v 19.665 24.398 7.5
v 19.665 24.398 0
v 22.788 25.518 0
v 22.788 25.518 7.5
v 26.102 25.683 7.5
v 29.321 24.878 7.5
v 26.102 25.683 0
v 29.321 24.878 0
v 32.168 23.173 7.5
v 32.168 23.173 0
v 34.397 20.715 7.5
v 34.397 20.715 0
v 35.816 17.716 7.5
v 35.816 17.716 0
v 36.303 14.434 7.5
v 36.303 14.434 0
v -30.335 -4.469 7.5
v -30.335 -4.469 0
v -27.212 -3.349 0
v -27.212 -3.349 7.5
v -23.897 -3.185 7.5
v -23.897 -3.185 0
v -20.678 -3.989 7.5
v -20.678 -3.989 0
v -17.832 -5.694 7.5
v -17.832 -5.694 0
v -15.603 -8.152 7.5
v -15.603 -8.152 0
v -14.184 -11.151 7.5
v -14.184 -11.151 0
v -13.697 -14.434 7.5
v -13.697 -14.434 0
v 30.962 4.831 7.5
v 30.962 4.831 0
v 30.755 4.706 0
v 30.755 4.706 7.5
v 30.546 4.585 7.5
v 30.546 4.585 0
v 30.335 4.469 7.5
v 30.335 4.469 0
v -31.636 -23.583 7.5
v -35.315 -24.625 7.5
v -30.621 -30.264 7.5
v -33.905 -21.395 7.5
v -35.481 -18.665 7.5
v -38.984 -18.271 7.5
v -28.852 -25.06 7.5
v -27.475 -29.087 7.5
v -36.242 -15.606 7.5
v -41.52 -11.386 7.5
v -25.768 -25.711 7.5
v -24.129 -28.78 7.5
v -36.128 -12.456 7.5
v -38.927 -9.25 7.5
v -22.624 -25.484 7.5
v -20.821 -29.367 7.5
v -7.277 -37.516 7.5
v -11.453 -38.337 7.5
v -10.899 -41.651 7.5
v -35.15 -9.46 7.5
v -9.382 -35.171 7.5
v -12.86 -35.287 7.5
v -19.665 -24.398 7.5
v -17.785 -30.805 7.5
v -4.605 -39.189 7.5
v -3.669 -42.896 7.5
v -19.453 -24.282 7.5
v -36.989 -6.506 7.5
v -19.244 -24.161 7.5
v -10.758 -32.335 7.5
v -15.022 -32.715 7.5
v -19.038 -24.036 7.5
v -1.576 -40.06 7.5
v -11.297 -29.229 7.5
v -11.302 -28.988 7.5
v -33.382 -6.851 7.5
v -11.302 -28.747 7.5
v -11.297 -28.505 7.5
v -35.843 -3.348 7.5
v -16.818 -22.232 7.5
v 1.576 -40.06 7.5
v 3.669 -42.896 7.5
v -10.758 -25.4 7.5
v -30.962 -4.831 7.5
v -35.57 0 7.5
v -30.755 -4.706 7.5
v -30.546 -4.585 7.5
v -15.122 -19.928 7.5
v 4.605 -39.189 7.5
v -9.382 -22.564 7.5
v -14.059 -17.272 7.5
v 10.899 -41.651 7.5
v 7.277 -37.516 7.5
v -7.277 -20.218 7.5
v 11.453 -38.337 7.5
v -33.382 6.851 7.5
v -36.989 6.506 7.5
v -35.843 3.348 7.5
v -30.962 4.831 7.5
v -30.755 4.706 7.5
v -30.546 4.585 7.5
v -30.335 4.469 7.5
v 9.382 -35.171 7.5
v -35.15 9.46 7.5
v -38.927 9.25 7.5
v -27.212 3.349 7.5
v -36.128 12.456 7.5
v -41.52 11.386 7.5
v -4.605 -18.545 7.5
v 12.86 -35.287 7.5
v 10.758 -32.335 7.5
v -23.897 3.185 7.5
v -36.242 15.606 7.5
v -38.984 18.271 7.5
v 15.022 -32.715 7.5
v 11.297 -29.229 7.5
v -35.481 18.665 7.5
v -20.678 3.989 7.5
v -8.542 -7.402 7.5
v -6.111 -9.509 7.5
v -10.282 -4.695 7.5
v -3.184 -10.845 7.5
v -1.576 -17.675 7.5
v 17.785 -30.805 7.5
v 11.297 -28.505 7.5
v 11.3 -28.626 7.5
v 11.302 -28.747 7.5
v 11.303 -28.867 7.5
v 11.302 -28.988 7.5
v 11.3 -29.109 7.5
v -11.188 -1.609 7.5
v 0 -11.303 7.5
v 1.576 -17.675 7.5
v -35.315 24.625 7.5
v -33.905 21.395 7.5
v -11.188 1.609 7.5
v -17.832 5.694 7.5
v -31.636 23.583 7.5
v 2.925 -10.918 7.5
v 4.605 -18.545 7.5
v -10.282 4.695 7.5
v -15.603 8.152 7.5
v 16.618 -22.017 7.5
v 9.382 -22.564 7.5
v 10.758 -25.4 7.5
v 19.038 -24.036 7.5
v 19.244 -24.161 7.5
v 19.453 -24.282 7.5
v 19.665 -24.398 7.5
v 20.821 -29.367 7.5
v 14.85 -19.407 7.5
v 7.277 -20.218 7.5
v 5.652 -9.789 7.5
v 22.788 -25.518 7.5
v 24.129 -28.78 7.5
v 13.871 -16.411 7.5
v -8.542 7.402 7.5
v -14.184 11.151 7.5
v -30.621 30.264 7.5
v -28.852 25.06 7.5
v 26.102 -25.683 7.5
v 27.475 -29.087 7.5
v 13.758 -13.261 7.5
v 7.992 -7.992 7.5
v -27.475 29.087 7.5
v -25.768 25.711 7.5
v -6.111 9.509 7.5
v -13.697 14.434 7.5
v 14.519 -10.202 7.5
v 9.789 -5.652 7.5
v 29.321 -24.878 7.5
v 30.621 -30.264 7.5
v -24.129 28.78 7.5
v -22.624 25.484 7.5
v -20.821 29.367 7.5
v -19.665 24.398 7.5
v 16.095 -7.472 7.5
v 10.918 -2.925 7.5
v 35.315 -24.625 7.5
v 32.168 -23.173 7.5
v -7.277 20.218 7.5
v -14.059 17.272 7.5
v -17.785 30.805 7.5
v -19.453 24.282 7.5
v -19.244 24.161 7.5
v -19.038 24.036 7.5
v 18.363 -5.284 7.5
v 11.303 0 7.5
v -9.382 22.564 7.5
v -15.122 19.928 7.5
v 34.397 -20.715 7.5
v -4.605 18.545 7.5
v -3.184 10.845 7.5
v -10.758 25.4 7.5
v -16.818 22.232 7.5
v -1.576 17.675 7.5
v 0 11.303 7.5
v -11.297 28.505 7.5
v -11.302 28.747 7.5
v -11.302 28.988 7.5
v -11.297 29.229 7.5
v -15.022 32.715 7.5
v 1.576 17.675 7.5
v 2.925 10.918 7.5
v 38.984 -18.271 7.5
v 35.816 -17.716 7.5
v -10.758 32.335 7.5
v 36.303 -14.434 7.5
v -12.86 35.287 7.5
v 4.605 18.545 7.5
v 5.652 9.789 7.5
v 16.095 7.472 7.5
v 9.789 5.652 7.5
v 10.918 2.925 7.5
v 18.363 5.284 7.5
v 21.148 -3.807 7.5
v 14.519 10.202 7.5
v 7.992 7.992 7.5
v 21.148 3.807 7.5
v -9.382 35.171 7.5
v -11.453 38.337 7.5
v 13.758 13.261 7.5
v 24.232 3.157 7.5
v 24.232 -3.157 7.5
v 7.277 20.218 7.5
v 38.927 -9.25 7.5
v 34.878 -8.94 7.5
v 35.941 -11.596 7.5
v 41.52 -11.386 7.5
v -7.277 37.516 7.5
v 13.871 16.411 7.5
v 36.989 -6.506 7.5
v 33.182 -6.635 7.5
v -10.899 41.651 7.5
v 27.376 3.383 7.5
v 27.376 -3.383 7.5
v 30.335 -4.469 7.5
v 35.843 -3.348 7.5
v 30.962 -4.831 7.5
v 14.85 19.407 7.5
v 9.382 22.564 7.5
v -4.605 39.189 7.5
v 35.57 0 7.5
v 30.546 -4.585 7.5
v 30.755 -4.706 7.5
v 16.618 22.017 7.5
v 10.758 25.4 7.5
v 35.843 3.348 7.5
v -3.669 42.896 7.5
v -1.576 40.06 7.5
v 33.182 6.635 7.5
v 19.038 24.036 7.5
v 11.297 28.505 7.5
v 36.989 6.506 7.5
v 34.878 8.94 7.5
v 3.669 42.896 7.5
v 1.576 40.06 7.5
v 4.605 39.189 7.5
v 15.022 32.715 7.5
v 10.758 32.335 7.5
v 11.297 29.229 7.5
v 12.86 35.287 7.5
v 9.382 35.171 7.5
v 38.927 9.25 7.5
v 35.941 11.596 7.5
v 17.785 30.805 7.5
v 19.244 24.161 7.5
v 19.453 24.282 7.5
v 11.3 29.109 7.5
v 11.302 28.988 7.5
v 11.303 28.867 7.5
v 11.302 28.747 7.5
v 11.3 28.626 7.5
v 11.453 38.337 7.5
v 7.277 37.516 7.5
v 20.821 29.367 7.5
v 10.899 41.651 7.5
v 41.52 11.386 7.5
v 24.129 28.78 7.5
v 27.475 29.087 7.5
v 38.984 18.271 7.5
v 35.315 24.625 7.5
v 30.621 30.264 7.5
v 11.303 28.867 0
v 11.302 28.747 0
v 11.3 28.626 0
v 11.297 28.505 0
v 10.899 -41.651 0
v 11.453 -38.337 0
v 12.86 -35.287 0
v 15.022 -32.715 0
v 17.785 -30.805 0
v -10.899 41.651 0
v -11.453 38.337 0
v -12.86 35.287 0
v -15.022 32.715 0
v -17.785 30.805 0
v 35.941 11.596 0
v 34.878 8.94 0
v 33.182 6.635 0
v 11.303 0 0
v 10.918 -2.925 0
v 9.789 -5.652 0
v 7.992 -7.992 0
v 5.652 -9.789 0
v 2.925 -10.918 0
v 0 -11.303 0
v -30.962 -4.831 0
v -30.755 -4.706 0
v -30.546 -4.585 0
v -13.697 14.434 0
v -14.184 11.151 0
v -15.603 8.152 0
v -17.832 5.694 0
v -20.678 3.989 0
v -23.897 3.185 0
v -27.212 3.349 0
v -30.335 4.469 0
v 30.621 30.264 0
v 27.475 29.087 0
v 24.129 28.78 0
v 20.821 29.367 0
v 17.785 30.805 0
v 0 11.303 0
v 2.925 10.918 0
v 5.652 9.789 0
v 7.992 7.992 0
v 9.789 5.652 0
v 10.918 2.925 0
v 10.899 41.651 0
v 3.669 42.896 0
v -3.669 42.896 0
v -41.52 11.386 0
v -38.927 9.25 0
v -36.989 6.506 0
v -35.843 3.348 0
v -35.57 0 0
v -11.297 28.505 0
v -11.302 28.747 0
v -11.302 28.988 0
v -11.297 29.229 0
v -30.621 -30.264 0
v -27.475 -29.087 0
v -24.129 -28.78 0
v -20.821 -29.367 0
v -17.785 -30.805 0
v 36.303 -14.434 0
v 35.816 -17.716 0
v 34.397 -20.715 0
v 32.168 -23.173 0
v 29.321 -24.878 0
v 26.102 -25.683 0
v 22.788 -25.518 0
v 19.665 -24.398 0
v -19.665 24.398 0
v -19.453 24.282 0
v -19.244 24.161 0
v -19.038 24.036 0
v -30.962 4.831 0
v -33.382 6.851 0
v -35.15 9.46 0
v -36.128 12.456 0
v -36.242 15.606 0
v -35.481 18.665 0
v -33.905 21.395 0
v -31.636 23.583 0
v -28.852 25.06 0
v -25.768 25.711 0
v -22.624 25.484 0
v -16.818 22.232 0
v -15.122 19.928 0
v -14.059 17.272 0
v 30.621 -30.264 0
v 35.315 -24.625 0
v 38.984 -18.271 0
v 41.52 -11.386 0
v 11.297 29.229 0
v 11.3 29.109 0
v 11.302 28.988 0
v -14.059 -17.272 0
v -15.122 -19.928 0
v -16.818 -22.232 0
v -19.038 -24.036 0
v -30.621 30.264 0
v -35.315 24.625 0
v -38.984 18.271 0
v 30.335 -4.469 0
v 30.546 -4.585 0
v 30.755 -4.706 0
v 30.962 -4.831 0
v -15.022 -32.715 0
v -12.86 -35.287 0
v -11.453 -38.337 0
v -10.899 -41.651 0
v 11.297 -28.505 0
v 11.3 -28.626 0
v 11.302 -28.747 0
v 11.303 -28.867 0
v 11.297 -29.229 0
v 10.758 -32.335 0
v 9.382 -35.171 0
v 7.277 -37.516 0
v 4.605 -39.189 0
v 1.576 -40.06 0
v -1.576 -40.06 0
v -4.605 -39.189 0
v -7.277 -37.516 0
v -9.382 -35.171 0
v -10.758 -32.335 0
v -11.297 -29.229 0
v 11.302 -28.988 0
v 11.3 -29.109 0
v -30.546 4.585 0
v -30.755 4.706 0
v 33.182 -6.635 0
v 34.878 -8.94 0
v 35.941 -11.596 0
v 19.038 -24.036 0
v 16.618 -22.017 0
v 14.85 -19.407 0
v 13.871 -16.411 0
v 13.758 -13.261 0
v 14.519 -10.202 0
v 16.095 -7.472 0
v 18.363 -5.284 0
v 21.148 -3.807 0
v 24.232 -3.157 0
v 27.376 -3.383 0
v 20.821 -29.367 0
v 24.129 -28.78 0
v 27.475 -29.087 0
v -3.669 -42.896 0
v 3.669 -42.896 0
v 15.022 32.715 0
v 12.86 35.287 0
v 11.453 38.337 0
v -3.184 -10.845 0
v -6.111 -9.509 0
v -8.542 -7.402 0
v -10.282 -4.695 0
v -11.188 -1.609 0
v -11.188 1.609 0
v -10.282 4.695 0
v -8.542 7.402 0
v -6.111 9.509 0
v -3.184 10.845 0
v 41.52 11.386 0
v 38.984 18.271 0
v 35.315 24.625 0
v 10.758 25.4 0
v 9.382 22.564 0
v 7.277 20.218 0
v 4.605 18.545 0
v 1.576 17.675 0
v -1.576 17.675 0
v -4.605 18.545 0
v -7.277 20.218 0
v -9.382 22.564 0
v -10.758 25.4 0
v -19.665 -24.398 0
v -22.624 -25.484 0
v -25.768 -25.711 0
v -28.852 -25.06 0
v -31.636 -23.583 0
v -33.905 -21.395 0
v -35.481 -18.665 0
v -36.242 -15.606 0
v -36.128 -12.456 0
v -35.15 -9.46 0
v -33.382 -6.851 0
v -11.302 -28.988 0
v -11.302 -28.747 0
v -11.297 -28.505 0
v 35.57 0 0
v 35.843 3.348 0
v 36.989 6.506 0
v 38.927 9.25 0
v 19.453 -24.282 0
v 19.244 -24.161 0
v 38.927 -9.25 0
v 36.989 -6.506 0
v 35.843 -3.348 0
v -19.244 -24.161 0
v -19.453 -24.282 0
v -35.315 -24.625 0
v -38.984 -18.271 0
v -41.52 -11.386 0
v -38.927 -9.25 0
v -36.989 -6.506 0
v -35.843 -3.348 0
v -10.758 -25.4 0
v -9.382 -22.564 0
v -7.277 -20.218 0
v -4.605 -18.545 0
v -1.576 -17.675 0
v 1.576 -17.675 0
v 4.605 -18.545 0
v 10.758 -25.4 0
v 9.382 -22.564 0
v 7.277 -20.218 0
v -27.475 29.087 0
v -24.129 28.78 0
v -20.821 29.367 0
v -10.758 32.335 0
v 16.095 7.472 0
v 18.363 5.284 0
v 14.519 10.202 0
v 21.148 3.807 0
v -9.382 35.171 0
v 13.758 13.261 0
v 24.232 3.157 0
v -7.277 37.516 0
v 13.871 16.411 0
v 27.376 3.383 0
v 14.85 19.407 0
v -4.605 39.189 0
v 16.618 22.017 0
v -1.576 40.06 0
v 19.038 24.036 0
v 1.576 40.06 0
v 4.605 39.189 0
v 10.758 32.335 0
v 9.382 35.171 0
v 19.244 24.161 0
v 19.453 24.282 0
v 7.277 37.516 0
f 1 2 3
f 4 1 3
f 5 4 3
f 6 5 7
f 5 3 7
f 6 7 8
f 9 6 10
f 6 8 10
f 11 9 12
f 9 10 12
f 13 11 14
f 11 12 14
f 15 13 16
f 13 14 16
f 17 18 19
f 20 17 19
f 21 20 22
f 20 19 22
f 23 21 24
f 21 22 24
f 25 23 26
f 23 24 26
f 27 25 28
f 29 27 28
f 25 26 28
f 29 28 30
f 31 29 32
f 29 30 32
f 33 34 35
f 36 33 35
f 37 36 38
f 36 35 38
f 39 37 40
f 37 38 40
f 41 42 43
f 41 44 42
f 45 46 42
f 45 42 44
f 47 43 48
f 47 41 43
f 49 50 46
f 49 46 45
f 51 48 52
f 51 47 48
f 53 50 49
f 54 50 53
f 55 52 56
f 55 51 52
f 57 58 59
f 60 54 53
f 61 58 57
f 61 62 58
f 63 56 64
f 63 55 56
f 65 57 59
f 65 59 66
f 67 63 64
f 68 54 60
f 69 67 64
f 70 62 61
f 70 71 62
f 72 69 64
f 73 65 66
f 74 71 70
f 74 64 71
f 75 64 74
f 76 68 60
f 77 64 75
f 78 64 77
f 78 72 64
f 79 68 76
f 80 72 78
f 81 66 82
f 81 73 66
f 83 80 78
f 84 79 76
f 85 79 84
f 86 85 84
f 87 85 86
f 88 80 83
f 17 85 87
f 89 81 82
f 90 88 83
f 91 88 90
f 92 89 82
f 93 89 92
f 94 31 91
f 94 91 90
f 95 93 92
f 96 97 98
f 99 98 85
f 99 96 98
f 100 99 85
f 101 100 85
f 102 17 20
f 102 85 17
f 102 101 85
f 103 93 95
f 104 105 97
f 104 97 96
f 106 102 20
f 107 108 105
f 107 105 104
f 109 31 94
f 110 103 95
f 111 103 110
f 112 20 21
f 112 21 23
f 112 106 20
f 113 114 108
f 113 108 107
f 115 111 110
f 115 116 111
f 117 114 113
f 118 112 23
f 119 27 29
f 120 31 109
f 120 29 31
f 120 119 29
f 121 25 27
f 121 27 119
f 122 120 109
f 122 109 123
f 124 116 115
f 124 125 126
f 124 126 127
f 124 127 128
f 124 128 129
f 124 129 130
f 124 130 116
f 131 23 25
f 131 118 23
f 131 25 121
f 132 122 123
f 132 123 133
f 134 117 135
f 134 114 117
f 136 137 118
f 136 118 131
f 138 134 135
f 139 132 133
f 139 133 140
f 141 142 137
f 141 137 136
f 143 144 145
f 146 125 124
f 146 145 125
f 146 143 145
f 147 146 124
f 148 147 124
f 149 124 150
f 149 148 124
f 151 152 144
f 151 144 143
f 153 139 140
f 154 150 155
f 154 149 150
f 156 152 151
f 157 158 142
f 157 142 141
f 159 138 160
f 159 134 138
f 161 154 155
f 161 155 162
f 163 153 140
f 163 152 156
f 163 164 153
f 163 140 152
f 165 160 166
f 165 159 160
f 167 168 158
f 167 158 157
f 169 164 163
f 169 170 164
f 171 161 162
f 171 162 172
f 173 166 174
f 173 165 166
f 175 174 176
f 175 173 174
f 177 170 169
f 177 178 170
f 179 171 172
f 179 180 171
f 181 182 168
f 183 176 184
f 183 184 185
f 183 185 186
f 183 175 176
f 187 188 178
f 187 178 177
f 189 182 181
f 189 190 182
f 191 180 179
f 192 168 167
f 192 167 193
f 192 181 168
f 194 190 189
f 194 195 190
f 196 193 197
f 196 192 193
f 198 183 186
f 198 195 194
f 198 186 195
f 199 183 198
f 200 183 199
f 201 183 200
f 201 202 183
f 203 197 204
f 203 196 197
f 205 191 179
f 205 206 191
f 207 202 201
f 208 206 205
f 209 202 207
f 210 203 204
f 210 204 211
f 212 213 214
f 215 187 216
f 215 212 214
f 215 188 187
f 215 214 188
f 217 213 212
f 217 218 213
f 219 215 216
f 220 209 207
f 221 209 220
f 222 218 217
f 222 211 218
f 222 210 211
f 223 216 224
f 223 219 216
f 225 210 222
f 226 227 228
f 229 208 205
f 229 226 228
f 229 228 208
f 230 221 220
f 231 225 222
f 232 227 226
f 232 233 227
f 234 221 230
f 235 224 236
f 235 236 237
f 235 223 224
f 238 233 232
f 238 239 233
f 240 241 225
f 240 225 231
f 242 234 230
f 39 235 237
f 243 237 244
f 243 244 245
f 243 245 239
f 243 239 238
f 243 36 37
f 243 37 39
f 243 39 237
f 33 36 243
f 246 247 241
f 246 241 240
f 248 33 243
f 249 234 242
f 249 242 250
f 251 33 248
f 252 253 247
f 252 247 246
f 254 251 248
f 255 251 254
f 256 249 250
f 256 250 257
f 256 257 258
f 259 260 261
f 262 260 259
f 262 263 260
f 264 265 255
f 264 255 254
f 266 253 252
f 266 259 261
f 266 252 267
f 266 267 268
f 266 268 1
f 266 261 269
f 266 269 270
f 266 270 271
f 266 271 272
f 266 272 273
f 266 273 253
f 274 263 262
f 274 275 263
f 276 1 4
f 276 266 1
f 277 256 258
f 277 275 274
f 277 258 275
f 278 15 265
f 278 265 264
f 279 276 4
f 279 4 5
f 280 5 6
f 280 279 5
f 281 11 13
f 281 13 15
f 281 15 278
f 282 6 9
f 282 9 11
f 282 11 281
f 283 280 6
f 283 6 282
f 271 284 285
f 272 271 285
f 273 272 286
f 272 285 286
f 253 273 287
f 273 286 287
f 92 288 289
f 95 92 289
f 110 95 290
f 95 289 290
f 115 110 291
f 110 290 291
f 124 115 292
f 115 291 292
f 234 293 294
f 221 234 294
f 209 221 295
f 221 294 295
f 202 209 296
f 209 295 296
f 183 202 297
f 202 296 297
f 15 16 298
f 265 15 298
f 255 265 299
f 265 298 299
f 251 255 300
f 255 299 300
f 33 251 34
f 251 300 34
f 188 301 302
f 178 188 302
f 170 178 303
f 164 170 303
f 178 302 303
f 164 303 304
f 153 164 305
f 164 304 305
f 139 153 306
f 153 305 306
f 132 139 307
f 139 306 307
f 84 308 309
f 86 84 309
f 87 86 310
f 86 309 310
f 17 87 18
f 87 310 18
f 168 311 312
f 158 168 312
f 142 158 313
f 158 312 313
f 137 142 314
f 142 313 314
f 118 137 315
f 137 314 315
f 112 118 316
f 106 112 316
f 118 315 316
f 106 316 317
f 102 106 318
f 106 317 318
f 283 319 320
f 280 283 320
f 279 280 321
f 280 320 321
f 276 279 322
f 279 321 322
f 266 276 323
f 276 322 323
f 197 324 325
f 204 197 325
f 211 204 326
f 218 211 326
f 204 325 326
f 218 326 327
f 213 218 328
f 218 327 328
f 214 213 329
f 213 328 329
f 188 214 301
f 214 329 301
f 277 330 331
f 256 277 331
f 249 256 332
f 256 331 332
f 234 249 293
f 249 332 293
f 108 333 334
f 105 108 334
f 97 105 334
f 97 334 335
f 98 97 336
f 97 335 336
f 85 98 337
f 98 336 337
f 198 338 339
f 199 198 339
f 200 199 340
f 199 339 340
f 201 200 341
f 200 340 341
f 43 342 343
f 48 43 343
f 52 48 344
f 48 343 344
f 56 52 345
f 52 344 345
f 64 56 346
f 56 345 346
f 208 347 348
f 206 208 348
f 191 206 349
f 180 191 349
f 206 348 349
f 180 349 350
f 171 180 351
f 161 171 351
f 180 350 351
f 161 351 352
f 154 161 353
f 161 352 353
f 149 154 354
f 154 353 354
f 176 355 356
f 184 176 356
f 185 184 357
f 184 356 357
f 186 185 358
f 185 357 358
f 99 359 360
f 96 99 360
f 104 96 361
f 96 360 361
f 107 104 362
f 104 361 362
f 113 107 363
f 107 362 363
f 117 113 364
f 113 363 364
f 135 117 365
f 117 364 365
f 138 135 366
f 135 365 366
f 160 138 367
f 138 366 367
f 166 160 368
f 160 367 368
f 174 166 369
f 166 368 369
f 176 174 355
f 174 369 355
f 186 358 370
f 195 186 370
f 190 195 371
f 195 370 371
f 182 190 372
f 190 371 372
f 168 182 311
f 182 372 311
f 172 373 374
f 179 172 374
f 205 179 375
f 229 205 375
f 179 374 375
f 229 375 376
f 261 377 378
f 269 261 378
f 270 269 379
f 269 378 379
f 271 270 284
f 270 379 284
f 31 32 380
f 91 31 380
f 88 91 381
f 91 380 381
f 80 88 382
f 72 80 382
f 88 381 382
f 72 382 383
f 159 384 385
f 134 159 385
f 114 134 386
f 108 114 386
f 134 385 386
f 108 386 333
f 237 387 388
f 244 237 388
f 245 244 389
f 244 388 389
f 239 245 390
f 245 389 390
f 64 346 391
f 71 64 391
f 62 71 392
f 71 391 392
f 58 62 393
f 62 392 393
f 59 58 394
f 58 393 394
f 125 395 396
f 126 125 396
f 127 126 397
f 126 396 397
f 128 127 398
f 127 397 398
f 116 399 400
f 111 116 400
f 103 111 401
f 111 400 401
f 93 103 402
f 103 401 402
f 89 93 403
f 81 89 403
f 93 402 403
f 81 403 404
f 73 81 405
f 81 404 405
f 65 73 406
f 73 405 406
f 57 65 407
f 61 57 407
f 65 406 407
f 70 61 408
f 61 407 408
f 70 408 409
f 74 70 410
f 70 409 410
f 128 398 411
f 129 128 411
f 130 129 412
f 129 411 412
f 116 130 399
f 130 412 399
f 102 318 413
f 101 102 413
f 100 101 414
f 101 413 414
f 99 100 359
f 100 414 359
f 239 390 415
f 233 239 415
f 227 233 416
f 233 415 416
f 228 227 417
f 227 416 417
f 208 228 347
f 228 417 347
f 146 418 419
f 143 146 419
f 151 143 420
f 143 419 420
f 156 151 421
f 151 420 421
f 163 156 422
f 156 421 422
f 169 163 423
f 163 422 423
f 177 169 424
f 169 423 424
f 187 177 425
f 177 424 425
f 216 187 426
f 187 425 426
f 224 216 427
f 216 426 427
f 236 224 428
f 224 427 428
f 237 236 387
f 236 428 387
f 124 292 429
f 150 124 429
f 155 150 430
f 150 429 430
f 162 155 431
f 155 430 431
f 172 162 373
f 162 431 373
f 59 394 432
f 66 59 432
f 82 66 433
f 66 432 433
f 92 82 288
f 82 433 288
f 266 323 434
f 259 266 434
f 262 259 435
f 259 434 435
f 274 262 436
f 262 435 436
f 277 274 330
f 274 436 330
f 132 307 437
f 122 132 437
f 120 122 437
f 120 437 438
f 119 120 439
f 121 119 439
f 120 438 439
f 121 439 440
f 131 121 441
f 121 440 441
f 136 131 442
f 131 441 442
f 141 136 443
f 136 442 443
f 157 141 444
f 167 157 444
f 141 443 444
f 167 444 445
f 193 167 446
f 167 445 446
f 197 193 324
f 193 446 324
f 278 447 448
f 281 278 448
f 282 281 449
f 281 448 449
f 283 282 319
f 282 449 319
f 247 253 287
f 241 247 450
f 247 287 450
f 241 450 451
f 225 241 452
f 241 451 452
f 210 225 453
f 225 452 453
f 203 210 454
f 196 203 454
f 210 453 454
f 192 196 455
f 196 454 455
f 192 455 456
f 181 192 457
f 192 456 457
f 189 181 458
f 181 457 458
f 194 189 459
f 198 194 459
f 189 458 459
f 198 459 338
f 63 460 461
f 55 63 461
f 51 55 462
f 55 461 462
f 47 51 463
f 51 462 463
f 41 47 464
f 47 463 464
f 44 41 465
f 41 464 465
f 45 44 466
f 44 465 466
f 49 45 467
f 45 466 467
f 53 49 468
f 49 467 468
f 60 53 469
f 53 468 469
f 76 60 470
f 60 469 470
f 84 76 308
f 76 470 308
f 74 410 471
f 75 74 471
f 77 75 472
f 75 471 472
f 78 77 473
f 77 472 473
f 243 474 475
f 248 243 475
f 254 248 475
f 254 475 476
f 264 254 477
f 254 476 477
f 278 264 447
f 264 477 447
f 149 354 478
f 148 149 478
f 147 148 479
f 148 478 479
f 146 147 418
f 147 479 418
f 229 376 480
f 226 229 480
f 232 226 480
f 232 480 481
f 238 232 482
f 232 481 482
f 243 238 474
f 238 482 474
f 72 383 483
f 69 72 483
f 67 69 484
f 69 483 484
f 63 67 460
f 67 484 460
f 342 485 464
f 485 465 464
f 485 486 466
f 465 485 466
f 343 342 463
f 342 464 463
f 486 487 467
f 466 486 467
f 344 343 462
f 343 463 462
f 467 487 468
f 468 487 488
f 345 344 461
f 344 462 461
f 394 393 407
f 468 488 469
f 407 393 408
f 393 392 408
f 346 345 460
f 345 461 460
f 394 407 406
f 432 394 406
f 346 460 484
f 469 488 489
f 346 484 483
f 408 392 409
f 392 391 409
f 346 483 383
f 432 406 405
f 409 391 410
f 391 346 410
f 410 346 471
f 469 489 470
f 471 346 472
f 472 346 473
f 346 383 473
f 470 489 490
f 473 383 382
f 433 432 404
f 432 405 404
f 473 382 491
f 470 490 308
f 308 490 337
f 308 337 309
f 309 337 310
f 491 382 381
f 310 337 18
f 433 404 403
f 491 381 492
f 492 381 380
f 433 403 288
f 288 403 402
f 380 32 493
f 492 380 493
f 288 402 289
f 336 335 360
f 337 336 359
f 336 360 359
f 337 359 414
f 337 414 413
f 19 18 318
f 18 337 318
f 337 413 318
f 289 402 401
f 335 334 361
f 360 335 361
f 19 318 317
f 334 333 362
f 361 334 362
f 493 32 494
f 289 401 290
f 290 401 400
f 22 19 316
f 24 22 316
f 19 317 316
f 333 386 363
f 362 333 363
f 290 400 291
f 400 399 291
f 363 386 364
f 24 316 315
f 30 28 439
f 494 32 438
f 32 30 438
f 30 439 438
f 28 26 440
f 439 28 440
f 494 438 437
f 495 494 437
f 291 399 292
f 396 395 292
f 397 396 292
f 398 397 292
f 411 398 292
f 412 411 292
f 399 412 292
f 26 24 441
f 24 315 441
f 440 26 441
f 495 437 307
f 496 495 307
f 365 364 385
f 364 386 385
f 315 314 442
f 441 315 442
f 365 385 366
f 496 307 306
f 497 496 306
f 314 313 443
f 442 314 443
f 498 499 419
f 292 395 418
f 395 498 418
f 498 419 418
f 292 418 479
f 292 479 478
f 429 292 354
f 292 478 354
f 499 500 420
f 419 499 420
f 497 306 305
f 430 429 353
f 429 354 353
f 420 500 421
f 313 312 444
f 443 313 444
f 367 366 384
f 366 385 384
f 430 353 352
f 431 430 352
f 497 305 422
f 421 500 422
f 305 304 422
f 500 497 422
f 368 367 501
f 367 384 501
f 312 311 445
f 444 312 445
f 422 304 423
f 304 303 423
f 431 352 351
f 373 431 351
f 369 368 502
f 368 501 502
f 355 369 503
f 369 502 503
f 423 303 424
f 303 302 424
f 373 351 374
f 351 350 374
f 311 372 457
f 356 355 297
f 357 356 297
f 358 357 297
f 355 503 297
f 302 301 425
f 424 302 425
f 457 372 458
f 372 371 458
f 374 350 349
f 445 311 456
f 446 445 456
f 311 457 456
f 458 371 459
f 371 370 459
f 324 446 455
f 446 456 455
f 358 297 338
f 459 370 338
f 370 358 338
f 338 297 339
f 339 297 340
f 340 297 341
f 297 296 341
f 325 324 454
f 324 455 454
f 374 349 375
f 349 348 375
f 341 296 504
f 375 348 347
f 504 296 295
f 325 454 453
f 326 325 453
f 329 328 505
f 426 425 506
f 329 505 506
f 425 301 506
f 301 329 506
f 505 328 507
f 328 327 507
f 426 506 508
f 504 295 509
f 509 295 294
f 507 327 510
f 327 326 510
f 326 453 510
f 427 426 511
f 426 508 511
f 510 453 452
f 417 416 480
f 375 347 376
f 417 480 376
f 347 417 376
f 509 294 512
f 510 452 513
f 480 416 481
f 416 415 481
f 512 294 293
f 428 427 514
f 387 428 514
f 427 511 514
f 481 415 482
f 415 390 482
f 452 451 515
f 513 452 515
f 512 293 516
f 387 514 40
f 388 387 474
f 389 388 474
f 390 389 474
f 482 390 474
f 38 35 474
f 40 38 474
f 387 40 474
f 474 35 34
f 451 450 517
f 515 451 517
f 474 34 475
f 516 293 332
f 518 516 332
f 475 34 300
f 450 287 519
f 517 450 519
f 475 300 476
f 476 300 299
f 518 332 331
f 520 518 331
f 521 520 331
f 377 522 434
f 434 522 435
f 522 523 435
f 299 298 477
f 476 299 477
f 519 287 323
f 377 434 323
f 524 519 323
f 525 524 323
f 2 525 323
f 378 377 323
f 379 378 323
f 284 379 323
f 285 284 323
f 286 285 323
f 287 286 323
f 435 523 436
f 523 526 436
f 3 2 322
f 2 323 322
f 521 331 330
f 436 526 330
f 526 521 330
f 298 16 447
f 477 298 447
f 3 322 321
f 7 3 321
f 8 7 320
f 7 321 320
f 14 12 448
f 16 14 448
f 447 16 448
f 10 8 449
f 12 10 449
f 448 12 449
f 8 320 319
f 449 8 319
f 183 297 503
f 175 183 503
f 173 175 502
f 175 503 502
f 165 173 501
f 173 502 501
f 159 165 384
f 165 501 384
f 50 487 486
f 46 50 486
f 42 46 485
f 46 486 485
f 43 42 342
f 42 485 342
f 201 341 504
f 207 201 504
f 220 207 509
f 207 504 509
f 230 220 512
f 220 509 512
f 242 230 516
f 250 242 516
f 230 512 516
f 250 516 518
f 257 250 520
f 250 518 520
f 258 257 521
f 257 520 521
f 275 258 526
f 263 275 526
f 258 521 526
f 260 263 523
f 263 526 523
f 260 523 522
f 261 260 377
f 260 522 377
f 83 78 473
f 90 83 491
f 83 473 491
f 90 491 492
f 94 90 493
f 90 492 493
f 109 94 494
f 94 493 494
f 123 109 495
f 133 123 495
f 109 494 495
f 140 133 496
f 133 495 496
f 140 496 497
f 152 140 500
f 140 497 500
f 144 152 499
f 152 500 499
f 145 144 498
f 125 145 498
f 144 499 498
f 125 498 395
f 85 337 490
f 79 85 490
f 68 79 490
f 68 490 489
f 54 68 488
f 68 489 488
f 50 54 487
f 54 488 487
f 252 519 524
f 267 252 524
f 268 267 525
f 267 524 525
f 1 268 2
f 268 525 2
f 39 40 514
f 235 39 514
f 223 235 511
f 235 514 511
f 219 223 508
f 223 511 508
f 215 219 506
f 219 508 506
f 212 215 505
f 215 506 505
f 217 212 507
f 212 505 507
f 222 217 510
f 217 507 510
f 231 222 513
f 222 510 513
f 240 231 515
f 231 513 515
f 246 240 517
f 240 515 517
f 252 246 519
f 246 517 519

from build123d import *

# Parameters (mm, degrees)
F1_DEPTH = 7.5


with BuildPart() as f1:
    # F0 (on Top) → F1 (new body)
    with BuildSketch(Plane.XY):
        with BuildLine():
            Line((10.8992387595, -41.6505390537), (11.2972032945, -29.229196955))
            ThreePointArc((11.2972032945, -29.229196955), (0, -40.1702484457), (-11.2972032945, -29.229196955))
            Line((-11.2972032945, -29.229196955), (-10.8992387595, -41.6505390537))
            ThreePointArc((-10.8992387595, -41.6505390537), (0, -43.053), (10.8992387595, -41.6505390537))
        make_face()
        with BuildLine():
            Line((11.2972032945, -19.5673300895), (3.0451878052, -14.8030267253))
            ThreePointArc((3.0451878052, -14.8030267253), (0, -15.113), (-3.0451878052, -14.8030267253))
            Line((-3.0451878052, -14.8030267253), (-11.2972032945, -19.5673300895))
            Line((-11.2972032945, -19.5673300895), (-11.2972032945, -28.5052999365))
            ThreePointArc((-11.2972032945, -28.5052999365), (0, -17.5642484457), (11.2972032945, -28.5052999365))
            Line((11.2972032945, -28.5052999365), (11.2972032945, -19.5673300895))
        make_face()
        with BuildLine():
            Line((-11.2972032945, -28.5052999365), (-11.2972032945, -19.5673300895))
            Line((-11.2972032945, -19.5673300895), (-19.0377122402, -24.036315013))
            ThreePointArc((-19.0377122402, -24.036315013), (-19.3482704914, -24.2223093618), (-19.664625448, -24.3982635222))
            Line((-19.664625448, -24.3982635222), (-30.6208055221, -30.2642871745))
            ThreePointArc((-30.6208055221, -30.2642871745), (-24.1291251272, -28.7802900435), (-17.7852261309, -30.8049152829))
            ThreePointArc((-17.7852261309, -30.8049152829), (-12.8598997424, -35.286580353), (-10.8992387595, -41.6505390537))
            Line((-10.8992387595, -41.6505390537), (-11.2972032945, -29.229196955))
            ThreePointArc((-11.2972032945, -29.229196955), (-11.303, -28.8672484457), (-11.2972032945, -28.5052999365))
        make_face()
        with BuildLine():
            Line((-11.2972032945, -19.5673300895), (-3.0451878052, -14.8030267253))
            ThreePointArc((-3.0451878052, -14.8030267253), (-7.5565, -13.0882419274), (-11.2972032945, -10.0387233612))
            Line((-11.2972032945, -10.0387233612), (-11.2972032945, -19.5673300895))
        make_face()
        with BuildLine():
            Line((11.2972032945, -19.5673300895), (11.2972032945, -10.0387233612))
            ThreePointArc((11.2972032945, -10.0387233612), (7.5565, -13.0882419274), (3.0451878052, -14.8030267253))
            Line((3.0451878052, -14.8030267253), (11.2972032945, -19.5673300895))
        make_face()
        with BuildLine():
            ThreePointArc((14.3423910996, -4.7643033641), (14.9191039558, -2.413111302), (15.113, 0))
            ThreePointArc((15.113, 0), (14.9191039558, 2.413111302), (14.3423910996, 4.7643033641))
            ThreePointArc((14.3423910996, 4.7643033641), (13.0882419274, 7.5565), (11.2972032945, 10.0387233612))
            ThreePointArc((11.2972032945, 10.0387233612), (7.5565, 13.0882419274), (3.0451878052, 14.8030267253))
            ThreePointArc((3.0451878052, 14.8030267253), (0, 15.113), (-3.0451878052, 14.8030267253))
            ThreePointArc((-3.0451878052, 14.8030267253), (-7.5565, 13.0882419274), (-11.2972032945, 10.0387233612))
            ThreePointArc((-11.2972032945, 10.0387233612), (-13.0882419274, 7.5565), (-14.3423910996, 4.7643033641))
            ThreePointArc((-14.3423910996, 4.7643033641), (-15.113, 0), (-14.3423910996, -4.7643033641))
            ThreePointArc((-14.3423910996, -4.7643033641), (-13.0882419274, -7.5565), (-11.2972032945, -10.0387233612))
            ThreePointArc((-11.2972032945, -10.0387233612), (-7.5565, -13.0882419274), (-3.0451878052, -14.8030267253))
            ThreePointArc((-3.0451878052, -14.8030267253), (0, -15.113), (3.0451878052, -14.8030267253))
            ThreePointArc((3.0451878052, -14.8030267253), (7.5565, -13.0882419274), (11.2972032945, -10.0387233612))
            ThreePointArc((11.2972032945, -10.0387233612), (13.0882419274, -7.5565), (14.3423910996, -4.7643033641))
        make_face()
        with BuildLine():
            ThreePointArc((0, 11.303), (7.9924279478, 7.9924279478), (11.303, 0))
            ThreePointArc((11.303, 0), (7.9924279478, -7.9924279478), (0, -11.303))
            ThreePointArc((0, -11.303), (-11.303, 0), (0, 11.303))
        make_face(mode=Mode.SUBTRACT)
        with BuildLine():
            Line((-11.2972032945, -19.5673300895), (-11.2972032945, -10.0387233612))
            ThreePointArc((-11.2972032945, -10.0387233612), (-13.0882419274, -7.5565), (-14.3423910996, -4.7643033641))
            Line((-14.3423910996, -4.7643033641), (-22.5944065889, 0))
            Line((-22.5944065889, 0), (-30.3349155347, -4.4689849235))
            ThreePointArc((-30.3349155347, -4.4689849235), (-19.1922467258, -4.736692919), (-13.6967704914, -14.4336242229))
            ThreePointArc((-13.6967704914, -14.4336242229), (-15.1218417254, -19.927651188), (-19.0377122402, -24.036315013))
            Line((-19.0377122402, -24.036315013), (-11.2972032945, -19.5673300895))
        make_face()
        with BuildLine():
            Line((19.0377122402, -24.036315013), (11.2972032945, -19.5673300895))
            Line((11.2972032945, -19.5673300895), (11.2972032945, -28.5052999365))
            ThreePointArc((11.2972032945, -28.5052999365), (11.3015507307, -28.6862509836), (11.303, -28.8672484457))
            ThreePointArc((11.303, -28.8672484457), (11.3015507307, -29.0482459079), (11.2972032945, -29.229196955))
            Line((11.2972032945, -29.229196955), (10.8992387595, -41.6505390537))
            ThreePointArc((10.8992387595, -41.6505390537), (12.8598997424, -35.286580353), (17.7852261309, -30.8049152829))
            ThreePointArc((17.7852261309, -30.8049152829), (24.1291251272, -28.7802900435), (30.6208055221, -30.2642871745))
            Line((30.6208055221, -30.2642871745), (19.664625448, -24.3982635222))
            ThreePointArc((19.664625448, -24.3982635222), (19.3482704914, -24.2223093619), (19.0377122402, -24.036315013))
        make_face()
        with BuildLine():
            Line((22.5944065889, 0), (14.3423910996, -4.7643033641))
            ThreePointArc((14.3423910996, -4.7643033641), (13.0882419274, -7.5565), (11.2972032945, -10.0387233612))
            Line((11.2972032945, -10.0387233612), (11.2972032945, -19.5673300895))
            Line((11.2972032945, -19.5673300895), (19.0377122402, -24.036315013))
            ThreePointArc((19.0377122402, -24.036315013), (15.2110853524, -8.7821242229), (30.3349155347, -4.4689849235))
            Line((30.3349155347, -4.4689849235), (22.5944065889, 0))
        make_face()
        with BuildLine():
            Line((41.5200442816, -11.3862518792), (30.9618287425, -4.8309334328))
            ThreePointArc((30.9618287425, -4.8309334328), (34.8776992574, -8.9395972577), (36.3027704914, -14.4336242229))
            ThreePointArc((36.3027704914, -14.4336242229), (30.8072942569, -24.1305555268), (19.664625448, -24.3982635222))
            Line((19.664625448, -24.3982635222), (30.6208055221, -30.2642871745))
            ThreePointArc((30.6208055221, -30.2642871745), (37.2849917091, -21.5265), (41.5200442816, -11.3862518792))
        make_face()
        with BuildLine():
            Line((-30.6208055221, -30.2642871745), (-19.664625448, -24.3982635222))
            ThreePointArc((-19.664625448, -24.3982635222), (-34.7884556304, -20.0851242229), (-30.9618287425, -4.8309334328))
            Line((-30.9618287425, -4.8309334328), (-41.5200442816, -11.3862518792))
            ThreePointArc((-41.5200442816, -11.3862518792), (-37.2849917091, -21.5265), (-30.6208055221, -30.2642871745))
        make_face()
        with BuildLine():
            Line((-30.3349155347, -4.4689849235), (-22.5944065889, 0))
            Line((-22.5944065889, 0), (-30.3349155347, 4.4689849235))
            ThreePointArc((-30.3349155347, 4.4689849235), (-30.6512704914, 4.6449390839), (-30.9618287425, 4.8309334328))
            Line((-30.9618287425, 4.8309334328), (-41.5200442816, 11.3862518792))
            ThreePointArc((-41.5200442816, 11.3862518792), (-36.9890248695, 6.5062903095), (-35.5704522619, 0))
            ThreePointArc((-35.5704522619, 0), (-36.9890248695, -6.5062903095), (-41.5200442816, -11.3862518792))
            Line((-41.5200442816, -11.3862518792), (-30.9618287425, -4.8309334328))
            ThreePointArc((-30.9618287425, -4.8309334328), (-30.6512704914, -4.6449390839), (-30.3349155347, -4.4689849235))
        make_face()
        with BuildLine():
            ThreePointArc((-14.3423910996, -4.7643033641), (-15.113, 0), (-14.3423910996, 4.7643033641))
            Line((-14.3423910996, 4.7643033641), (-22.5944065889, 0))
            Line((-22.5944065889, 0), (-14.3423910996, -4.7643033641))
        make_face()
        with BuildLine():
            ThreePointArc((-14.3423910996, 4.7643033641), (-13.0882419274, 7.5565), (-11.2972032945, 10.0387233612))
            Line((-11.2972032945, 10.0387233612), (-11.2972032945, 19.5673300895))
            Line((-11.2972032945, 19.5673300895), (-19.0377122402, 24.036315013))
            ThreePointArc((-19.0377122402, 24.036315013), (-15.1218417254, 19.927651188), (-13.6967704914, 14.4336242229))
            ThreePointArc((-13.6967704914, 14.4336242229), (-19.1922467258, 4.736692919), (-30.3349155347, 4.4689849235))
            Line((-30.3349155347, 4.4689849235), (-22.5944065889, 0))
            Line((-22.5944065889, 0), (-14.3423910996, 4.7643033641))
        make_face()
        with BuildLine():
            ThreePointArc((-30.9618287425, 4.8309334328), (-34.7884556304, 20.0851242229), (-19.664625448, 24.3982635222))
            Line((-19.664625448, 24.3982635222), (-30.6208055221, 30.2642871745))
            ThreePointArc((-30.6208055221, 30.2642871745), (-37.2849917091, 21.5265), (-41.5200442816, 11.3862518792))
            Line((-41.5200442816, 11.3862518792), (-30.9618287425, 4.8309334328))
        make_face()
        with BuildLine():
            Line((30.3349155347, 4.4689849235), (22.5944065889, 0))
            Line((22.5944065889, 0), (30.3349155347, -4.4689849235))
            ThreePointArc((30.3349155347, -4.4689849235), (30.6512704914, -4.6449390839), (30.9618287425, -4.8309334328))
            Line((30.9618287425, -4.8309334328), (41.5200442816, -11.3862518792))
            ThreePointArc((41.5200442816, -11.3862518792), (36.9890248695, -6.5062903095), (35.5704522619, 0))
            ThreePointArc((35.5704522619, 0), (36.9890248695, 6.5062903095), (41.5200442816, 11.3862518792))
            Line((41.5200442816, 11.3862518792), (30.9618287425, 4.8309334328))
            ThreePointArc((30.9618287425, 4.8309334328), (30.6512704914, 4.6449390839), (30.3349155347, 4.4689849235))
        make_face()
        with BuildLine():
            ThreePointArc((14.3423910996, 4.7643033641), (14.9191039558, 2.413111302), (15.113, 0))
            ThreePointArc((15.113, 0), (14.9191039558, -2.413111302), (14.3423910996, -4.7643033641))
            Line((14.3423910996, -4.7643033641), (22.5944065889, 0))
            Line((22.5944065889, 0), (14.3423910996, 4.7643033641))
        make_face()
        with BuildLine():
            ThreePointArc((11.2972032945, 10.0387233612), (13.0882419274, 7.5565), (14.3423910996, 4.7643033641))
            Line((14.3423910996, 4.7643033641), (22.5944065889, 0))
            Line((22.5944065889, 0), (30.3349155347, 4.4689849235))
            ThreePointArc((30.3349155347, 4.4689849235), (15.2110853524, 8.7821242229), (19.0377122402, 24.036315013))
            Line((19.0377122402, 24.036315013), (11.2972032945, 19.5673300895))
            Line((11.2972032945, 19.5673300895), (11.2972032945, 10.0387233612))
        make_face()
        with BuildLine():
            ThreePointArc((36.3027704914, 14.4336242229), (34.8776992574, 8.9395972577), (30.9618287425, 4.8309334328))
            Line((30.9618287425, 4.8309334328), (41.5200442816, 11.3862518792))
            ThreePointArc((41.5200442816, 11.3862518792), (37.2849917091, 21.5265), (30.6208055221, 30.2642871745))
            Line((30.6208055221, 30.2642871745), (19.664625448, 24.3982635222))
            ThreePointArc((19.664625448, 24.3982635222), (30.8072942569, 24.1305555268), (36.3027704914, 14.4336242229))
        make_face()
        with BuildLine():
            ThreePointArc((3.0451878052, 14.8030267253), (7.5565, 13.0882419274), (11.2972032945, 10.0387233612))
            Line((11.2972032945, 10.0387233612), (11.2972032945, 19.5673300895))
            Line((11.2972032945, 19.5673300895), (3.0451878052, 14.8030267253))
        make_face()
        with BuildLine():
            ThreePointArc((-11.2972032945, 10.0387233612), (-7.5565, 13.0882419274), (-3.0451878052, 14.8030267253))
            Line((-3.0451878052, 14.8030267253), (-11.2972032945, 19.5673300895))
            Line((-11.2972032945, 19.5673300895), (-11.2972032945, 10.0387233612))
        make_face()
        with BuildLine():
            ThreePointArc((-3.0451878052, 14.8030267253), (0, 15.113), (3.0451878052, 14.8030267253))
            Line((3.0451878052, 14.8030267253), (11.2972032945, 19.5673300895))
            Line((11.2972032945, 19.5673300895), (11.2972032945, 28.5052999365))
            ThreePointArc((11.2972032945, 28.5052999365), (0, 17.5642484457), (-11.2972032945, 28.5052999365))
            Line((-11.2972032945, 28.5052999365), (-11.2972032945, 19.5673300895))
            Line((-11.2972032945, 19.5673300895), (-3.0451878052, 14.8030267253))
        make_face()
        with BuildLine():
            ThreePointArc((-11.2972032945, 29.229196955), (0, 40.1702484457), (11.2972032945, 29.229196955))
            Line((11.2972032945, 29.229196955), (10.8992387595, 41.6505390537))
            ThreePointArc((10.8992387595, 41.6505390537), (0, 43.053), (-10.8992387595, 41.6505390537))
            Line((-10.8992387595, 41.6505390537), (-11.2972032945, 29.229196955))
        make_face()
        with BuildLine():
            Line((-19.0377122402, 24.036315013), (-11.2972032945, 19.5673300895))
            Line((-11.2972032945, 19.5673300895), (-11.2972032945, 28.5052999365))
            ThreePointArc((-11.2972032945, 28.5052999365), (-11.303, 28.8672484457), (-11.2972032945, 29.229196955))
            Line((-11.2972032945, 29.229196955), (-10.8992387595, 41.6505390537))
            ThreePointArc((-10.8992387595, 41.6505390537), (-12.8598997424, 35.286580353), (-17.7852261309, 30.8049152829))
            ThreePointArc((-17.7852261309, 30.8049152829), (-24.1291251272, 28.7802900435), (-30.6208055221, 30.2642871745))
            Line((-30.6208055221, 30.2642871745), (-19.664625448, 24.3982635222))
            ThreePointArc((-19.664625448, 24.3982635222), (-19.3482704914, 24.2223093619), (-19.0377122402, 24.036315013))
        make_face()
        with BuildLine():
            Line((11.2972032945, 28.5052999365), (11.2972032945, 19.5673300895))
            Line((11.2972032945, 19.5673300895), (19.0377122402, 24.036315013))
            ThreePointArc((19.0377122402, 24.036315013), (19.3482704914, 24.2223093619), (19.664625448, 24.3982635222))
            Line((19.664625448, 24.3982635222), (30.6208055221, 30.2642871745))
            ThreePointArc((30.6208055221, 30.2642871745), (24.1291251272, 28.7802900435), (17.7852261309, 30.8049152829))
            ThreePointArc((17.7852261309, 30.8049152829), (12.8598997424, 35.286580353), (10.8992387595, 41.6505390537))
            Line((10.8992387595, 41.6505390537), (11.2972032945, 29.229196955))
            ThreePointArc((11.2972032945, 29.229196955), (11.3015507307, 29.0482459079), (11.303, 28.8672484457))
            ThreePointArc((11.303, 28.8672484457), (11.3015507307, 28.6862509836), (11.2972032945, 28.5052999365))
        make_face()
    extrude(amount=F1_DEPTH)


solid = f1.part
